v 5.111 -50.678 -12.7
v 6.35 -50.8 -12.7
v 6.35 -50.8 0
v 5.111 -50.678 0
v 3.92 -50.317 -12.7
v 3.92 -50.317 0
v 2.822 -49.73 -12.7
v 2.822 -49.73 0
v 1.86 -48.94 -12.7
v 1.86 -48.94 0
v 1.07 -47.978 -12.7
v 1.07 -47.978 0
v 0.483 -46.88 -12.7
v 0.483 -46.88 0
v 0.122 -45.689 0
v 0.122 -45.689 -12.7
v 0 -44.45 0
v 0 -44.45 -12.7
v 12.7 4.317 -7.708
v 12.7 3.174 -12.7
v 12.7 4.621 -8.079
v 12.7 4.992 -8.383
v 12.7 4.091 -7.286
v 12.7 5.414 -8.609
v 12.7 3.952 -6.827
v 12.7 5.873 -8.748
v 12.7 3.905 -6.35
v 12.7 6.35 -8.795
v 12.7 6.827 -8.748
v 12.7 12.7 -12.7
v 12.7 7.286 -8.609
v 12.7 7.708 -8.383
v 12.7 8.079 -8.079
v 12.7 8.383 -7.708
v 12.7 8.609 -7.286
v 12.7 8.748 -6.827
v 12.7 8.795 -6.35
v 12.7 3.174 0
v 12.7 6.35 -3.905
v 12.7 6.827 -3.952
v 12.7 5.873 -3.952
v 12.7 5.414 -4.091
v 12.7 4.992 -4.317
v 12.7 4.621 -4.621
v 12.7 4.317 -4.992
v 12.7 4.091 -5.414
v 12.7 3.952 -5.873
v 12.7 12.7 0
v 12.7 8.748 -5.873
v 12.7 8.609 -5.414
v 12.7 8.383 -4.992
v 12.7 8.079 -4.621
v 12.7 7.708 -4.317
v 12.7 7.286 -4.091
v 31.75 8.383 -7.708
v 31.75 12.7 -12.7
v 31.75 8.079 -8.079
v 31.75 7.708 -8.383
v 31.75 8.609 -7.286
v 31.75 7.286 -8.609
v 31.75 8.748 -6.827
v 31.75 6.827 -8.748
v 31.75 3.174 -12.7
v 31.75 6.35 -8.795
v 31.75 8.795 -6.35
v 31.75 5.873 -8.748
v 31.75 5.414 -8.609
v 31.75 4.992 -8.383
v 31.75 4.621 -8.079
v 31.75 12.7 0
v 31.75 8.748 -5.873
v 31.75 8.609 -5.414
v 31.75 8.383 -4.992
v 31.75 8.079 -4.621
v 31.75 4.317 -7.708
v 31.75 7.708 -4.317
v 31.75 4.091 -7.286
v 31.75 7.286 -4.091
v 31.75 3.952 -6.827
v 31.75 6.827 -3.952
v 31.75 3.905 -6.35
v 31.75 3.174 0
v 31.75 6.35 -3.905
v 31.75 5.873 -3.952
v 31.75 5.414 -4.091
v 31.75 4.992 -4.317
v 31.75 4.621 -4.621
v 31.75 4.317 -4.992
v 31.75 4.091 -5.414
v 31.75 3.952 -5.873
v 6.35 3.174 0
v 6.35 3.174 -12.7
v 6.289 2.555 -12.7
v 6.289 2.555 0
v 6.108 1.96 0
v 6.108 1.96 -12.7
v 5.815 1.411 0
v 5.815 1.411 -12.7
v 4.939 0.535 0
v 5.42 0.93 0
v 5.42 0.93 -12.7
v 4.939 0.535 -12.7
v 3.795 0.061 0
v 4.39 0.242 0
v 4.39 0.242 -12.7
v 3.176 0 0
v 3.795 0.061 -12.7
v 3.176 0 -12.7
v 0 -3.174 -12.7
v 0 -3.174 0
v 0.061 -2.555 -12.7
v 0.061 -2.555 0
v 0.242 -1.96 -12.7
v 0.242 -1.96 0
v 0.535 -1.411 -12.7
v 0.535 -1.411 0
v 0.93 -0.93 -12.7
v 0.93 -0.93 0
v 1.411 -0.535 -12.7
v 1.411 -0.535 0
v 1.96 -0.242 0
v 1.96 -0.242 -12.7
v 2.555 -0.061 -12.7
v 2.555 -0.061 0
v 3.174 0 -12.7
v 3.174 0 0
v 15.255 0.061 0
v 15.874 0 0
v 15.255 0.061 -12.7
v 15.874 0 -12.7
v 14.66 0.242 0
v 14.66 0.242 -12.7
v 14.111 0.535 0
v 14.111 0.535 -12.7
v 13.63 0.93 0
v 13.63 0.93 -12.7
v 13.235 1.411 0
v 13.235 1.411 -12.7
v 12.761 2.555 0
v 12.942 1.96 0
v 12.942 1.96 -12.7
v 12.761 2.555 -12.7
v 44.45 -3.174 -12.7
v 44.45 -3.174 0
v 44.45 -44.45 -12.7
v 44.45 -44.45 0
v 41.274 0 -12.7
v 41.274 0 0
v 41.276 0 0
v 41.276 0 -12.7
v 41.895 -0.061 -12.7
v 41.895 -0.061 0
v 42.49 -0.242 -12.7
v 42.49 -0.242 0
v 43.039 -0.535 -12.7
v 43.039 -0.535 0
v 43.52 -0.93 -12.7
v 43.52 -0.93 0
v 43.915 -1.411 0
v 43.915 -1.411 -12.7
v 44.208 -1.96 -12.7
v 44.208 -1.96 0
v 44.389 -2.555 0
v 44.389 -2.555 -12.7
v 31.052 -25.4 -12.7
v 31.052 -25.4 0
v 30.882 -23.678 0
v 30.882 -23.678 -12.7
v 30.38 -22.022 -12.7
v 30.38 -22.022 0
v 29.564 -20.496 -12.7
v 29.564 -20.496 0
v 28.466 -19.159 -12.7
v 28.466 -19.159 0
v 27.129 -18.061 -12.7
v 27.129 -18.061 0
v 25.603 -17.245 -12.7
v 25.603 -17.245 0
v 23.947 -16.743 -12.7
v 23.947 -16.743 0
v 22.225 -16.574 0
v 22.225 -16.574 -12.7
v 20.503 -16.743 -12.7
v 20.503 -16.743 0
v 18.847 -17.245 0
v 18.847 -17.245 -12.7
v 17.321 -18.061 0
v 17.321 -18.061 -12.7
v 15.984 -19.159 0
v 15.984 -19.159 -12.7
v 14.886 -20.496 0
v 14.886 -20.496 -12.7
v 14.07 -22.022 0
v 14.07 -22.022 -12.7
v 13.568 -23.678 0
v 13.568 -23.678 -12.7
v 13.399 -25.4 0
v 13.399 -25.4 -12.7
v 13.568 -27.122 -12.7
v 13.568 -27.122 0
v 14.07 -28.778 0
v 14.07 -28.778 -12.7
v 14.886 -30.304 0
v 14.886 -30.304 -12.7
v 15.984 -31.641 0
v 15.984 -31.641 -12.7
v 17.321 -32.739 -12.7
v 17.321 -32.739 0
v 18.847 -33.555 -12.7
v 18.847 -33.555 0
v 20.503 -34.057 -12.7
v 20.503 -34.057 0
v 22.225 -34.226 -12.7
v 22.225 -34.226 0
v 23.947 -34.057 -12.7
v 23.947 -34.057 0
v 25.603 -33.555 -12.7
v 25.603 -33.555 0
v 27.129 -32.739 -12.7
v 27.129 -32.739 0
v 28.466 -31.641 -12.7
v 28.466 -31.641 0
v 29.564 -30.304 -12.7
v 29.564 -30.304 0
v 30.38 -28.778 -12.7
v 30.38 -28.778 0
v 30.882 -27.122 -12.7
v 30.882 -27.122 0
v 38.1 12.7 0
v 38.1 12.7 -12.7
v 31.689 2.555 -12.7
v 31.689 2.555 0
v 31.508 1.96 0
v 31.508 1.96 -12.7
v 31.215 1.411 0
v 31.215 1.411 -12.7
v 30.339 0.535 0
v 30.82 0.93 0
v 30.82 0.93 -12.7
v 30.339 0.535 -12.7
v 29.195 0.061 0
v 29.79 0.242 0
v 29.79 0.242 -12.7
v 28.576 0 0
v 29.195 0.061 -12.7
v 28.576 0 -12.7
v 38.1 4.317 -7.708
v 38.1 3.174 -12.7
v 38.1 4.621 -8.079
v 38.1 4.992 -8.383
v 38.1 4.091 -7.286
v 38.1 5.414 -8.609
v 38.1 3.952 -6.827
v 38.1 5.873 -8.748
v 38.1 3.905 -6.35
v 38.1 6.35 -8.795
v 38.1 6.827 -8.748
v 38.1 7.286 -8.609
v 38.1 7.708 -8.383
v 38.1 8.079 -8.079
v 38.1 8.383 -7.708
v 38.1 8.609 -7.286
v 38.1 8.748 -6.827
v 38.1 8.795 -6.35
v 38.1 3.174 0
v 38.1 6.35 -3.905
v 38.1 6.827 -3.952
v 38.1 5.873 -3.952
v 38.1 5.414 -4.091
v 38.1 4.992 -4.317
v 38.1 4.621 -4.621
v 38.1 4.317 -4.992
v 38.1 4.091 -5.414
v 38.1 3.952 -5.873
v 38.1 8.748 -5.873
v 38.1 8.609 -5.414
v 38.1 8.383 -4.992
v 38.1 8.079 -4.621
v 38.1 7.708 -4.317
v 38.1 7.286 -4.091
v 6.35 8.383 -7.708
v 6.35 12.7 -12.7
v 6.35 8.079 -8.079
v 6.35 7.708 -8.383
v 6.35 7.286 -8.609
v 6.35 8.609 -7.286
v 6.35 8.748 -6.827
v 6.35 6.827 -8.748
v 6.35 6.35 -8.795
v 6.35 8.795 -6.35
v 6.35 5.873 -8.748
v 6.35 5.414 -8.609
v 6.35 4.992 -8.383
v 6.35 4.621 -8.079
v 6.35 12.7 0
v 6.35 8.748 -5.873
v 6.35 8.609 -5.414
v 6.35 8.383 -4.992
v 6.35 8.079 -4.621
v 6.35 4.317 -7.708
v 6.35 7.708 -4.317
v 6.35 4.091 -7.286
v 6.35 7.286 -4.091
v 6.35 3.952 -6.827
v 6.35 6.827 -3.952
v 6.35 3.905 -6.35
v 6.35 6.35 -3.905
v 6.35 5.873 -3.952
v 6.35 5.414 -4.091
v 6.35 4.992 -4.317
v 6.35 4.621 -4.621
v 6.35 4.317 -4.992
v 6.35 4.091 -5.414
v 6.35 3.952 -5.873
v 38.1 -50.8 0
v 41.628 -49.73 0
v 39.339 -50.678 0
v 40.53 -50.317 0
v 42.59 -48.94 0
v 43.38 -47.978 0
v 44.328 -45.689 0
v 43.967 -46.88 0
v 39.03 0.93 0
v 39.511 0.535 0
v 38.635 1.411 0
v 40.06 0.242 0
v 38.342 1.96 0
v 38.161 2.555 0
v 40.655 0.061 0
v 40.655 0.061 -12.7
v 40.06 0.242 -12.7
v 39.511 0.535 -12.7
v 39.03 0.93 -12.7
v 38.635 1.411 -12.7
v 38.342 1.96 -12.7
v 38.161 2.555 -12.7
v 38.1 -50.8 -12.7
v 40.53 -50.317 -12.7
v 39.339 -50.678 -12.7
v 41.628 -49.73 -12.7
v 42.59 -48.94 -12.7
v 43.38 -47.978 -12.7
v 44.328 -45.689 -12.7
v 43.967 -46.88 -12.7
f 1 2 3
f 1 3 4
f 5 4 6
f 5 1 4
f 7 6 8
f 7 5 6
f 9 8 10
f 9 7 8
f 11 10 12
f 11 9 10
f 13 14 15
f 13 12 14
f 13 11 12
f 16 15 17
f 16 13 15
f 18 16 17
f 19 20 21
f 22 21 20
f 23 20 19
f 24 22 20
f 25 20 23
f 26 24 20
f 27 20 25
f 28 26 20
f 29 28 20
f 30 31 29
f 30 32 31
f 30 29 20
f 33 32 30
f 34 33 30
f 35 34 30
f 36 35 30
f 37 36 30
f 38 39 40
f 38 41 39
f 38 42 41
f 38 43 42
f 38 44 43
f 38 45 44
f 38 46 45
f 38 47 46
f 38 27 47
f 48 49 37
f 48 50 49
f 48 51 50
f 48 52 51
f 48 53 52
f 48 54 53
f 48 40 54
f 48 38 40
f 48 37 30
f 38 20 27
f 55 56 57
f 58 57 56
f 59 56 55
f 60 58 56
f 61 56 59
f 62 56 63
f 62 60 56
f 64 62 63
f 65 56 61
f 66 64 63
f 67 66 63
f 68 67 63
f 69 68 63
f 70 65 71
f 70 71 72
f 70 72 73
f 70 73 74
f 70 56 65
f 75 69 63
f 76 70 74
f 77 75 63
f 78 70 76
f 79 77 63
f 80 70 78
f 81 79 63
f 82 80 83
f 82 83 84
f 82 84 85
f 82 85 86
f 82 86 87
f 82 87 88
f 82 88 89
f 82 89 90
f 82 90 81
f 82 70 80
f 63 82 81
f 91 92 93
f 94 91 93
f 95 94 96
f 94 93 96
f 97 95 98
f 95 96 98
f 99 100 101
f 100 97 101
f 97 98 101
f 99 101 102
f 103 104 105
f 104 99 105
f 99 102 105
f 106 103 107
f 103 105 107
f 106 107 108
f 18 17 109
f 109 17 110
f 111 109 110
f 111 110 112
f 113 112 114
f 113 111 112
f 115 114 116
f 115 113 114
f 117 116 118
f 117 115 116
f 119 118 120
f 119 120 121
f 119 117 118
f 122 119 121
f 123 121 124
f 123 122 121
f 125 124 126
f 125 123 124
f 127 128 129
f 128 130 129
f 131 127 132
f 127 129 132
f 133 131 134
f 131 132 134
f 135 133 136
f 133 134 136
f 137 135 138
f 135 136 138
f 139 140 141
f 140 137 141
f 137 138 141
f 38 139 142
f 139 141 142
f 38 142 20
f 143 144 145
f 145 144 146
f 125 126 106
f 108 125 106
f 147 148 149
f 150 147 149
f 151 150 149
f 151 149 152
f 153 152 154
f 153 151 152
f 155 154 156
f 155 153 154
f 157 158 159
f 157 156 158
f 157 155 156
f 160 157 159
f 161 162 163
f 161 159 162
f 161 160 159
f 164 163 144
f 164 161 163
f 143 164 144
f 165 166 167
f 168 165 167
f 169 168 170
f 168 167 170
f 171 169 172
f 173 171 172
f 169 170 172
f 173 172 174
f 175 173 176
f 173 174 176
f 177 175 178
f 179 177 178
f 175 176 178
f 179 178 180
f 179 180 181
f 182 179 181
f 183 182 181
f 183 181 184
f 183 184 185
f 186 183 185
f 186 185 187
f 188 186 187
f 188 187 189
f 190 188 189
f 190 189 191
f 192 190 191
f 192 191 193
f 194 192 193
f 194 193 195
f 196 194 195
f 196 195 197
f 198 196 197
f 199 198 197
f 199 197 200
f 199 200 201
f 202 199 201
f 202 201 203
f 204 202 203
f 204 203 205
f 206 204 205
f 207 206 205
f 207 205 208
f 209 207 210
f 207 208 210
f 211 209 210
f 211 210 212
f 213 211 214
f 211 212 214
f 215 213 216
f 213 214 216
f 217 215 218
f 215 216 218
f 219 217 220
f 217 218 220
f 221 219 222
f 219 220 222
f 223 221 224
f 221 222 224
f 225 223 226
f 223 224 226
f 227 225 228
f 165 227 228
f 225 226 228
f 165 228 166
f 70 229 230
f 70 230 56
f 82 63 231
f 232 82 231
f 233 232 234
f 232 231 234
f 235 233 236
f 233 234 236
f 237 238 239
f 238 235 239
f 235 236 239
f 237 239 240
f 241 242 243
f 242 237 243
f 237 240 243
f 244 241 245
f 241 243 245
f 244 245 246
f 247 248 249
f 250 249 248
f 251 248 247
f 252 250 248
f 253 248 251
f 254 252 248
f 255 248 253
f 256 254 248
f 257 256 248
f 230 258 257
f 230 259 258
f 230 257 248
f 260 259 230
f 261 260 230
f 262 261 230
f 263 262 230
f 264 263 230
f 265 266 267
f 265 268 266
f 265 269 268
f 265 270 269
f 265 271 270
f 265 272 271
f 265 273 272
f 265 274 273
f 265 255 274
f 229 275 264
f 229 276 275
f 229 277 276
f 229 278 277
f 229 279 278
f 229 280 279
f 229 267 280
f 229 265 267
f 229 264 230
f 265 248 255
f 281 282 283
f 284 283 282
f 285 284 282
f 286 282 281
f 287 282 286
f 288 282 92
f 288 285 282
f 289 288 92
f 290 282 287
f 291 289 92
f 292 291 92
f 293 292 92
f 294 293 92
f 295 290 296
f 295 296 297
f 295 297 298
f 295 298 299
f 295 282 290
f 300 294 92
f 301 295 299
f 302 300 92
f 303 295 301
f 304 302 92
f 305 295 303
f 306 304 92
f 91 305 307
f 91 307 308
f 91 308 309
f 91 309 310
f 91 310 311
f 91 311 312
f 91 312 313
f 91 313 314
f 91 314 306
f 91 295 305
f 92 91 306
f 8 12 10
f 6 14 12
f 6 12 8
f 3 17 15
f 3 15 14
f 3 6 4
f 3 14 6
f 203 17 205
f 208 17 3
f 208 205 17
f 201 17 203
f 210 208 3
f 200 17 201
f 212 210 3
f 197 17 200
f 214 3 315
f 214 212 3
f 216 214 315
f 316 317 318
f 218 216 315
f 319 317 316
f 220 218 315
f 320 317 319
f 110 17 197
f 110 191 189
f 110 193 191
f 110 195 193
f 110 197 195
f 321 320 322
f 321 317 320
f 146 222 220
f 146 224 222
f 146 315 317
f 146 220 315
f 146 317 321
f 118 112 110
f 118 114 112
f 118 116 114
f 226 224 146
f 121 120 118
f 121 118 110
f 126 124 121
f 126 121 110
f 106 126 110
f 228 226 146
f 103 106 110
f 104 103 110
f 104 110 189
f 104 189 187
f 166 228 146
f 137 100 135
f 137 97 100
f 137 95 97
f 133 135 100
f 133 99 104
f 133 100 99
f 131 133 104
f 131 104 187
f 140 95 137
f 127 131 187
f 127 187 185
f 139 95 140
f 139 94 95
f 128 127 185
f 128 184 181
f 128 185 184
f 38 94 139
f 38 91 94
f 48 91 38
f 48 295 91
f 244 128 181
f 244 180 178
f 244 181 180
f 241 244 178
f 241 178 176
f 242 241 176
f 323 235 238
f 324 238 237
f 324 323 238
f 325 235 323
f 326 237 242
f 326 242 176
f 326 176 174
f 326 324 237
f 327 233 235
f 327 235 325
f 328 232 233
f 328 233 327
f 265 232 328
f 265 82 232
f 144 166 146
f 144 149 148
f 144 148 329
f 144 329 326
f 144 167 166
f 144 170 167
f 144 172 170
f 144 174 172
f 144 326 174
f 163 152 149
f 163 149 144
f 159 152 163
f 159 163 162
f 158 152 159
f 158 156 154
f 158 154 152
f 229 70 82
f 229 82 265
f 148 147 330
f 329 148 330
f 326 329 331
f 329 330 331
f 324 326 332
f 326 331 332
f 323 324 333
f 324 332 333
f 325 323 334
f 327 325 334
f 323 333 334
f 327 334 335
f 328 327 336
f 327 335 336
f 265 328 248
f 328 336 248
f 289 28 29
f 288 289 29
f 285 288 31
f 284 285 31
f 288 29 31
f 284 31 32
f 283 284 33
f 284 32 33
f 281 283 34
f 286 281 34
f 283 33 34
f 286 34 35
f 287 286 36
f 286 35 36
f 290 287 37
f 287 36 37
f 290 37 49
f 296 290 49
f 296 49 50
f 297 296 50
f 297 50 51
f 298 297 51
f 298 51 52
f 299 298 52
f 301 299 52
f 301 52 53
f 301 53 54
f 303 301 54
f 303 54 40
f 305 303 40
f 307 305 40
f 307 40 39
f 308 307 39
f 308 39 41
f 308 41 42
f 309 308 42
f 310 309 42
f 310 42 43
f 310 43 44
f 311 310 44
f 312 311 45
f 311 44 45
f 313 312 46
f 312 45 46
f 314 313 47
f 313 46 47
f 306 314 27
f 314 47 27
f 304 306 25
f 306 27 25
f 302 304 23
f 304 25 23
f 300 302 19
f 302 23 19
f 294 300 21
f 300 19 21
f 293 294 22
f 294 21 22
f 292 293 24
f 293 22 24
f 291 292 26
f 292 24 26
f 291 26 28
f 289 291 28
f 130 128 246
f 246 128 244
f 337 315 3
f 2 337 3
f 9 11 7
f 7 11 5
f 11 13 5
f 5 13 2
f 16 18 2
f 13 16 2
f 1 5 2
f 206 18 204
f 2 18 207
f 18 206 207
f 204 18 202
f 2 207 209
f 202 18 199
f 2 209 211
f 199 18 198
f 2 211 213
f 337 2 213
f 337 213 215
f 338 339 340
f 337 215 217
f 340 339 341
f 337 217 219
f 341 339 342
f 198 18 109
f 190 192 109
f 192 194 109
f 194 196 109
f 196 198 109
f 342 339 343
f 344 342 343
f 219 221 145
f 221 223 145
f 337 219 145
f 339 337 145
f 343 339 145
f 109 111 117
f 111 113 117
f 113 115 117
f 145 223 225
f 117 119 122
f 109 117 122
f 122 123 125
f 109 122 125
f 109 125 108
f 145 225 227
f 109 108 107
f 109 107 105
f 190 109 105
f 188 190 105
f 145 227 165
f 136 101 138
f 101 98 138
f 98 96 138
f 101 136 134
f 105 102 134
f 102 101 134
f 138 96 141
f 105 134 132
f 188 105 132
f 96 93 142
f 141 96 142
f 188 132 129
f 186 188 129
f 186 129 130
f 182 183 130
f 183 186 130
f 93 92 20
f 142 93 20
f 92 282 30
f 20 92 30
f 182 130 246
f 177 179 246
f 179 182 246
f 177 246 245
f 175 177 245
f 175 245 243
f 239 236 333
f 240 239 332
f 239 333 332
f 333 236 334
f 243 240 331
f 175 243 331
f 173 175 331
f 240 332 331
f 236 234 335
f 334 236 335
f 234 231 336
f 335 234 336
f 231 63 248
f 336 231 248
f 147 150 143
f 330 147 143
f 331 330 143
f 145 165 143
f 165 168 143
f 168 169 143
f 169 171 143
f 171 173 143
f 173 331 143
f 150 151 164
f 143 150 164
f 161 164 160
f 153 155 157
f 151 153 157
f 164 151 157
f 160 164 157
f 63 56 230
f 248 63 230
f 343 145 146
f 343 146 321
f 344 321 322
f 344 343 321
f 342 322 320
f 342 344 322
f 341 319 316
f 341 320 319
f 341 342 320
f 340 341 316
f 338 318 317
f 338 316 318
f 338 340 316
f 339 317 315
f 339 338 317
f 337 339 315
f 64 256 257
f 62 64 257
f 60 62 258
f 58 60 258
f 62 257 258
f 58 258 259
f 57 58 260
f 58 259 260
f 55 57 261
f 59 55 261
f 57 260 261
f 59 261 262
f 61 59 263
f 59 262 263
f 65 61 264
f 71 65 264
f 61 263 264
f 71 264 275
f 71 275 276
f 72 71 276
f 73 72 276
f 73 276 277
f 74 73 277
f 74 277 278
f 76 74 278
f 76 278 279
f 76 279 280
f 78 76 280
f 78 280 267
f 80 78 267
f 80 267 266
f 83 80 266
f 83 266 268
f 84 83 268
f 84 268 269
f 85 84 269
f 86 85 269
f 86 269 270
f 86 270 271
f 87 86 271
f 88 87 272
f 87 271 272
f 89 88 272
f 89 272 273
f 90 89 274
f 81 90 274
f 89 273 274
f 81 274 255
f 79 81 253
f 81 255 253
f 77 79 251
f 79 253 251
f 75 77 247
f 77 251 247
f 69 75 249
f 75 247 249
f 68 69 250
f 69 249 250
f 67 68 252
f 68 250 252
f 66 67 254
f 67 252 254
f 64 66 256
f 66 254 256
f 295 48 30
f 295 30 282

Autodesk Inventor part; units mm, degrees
ref_plane "YZ Plane" through (0, 0, 0) normal (1, 0, 0) x (0, 1, 0)
ref_plane "XZ Plane" through (0, 0, 0) normal (0, 1, 0) x (-1, 0, 0)
ref_plane "XY Plane" through (0, 0, 0) normal (0, 0, 1) x (1, 0, 0)
sketch "Sketch1" plane through (0, 0, 0) normal (0, 0, 1) x (1, 0, 0)
  line L0 (0, 0) -> (44.45, 0)
  line L1 (44.45, 0) -> (44.45, -50.8)
  line L2 (44.45, -50.8) -> (0, -50.8)
  line L3 (0, -50.8) -> (0, 0)
  line L4 (6.35, 0) -> (12.7, 0)
  line L5 (12.7, 0) -> (12.7, 12.7)
  line L6 (12.7, 12.7) -> (6.35, 12.7)
  line L7 (6.35, 12.7) -> (6.35, 0)
  line L8 (31.75, 0) -> (38.1, 0)
  line L9 (38.1, 0) -> (38.1, 12.7)
  line L10 (38.1, 12.7) -> (31.75, 12.7)
  line L11 (31.75, 12.7) -> (31.75, 0)
  circle A0 centre (22.225, -25.4) radius 9.5885
  dimension "d0" = 44.45
  dimension "d1" = 50.8
  dimension "d3" = 6.35
  dimension "d4" = 6.35
  dimension "d5" = 6.35
  dimension "d6" = 19.05
  dimension "d9" = 19.177
  dimension "d20" = 12.7
  dimension "d21" = 22.225
  dimension "d22" = 25.4
  dimension "d25" = 6.35
extrude "Extrusion1" add sketch "Sketch1" against normal blind 12.7 contours L0 L1 L2 L3 | L7 L6 L5 L0 | L11 L10 L9 L0 | A0
sketch "Sketch2" plane through (0, 0, 0) normal (0, 0, 1) x (1, 0, 0)
  circle A0 centre (22.225, -25.4) radius 8.8265
  line L0 (0, -50.8) -> (0, 0) projected
  dimension "d10" = 17.653
  dimension "d23" = 22.225
extrude "Extrusion2" cut sketch "Sketch2" against normal blind 12.7
sketch "Sketch3" plane through (38.1, 0, 0) normal (1, 0, 0) x (0, 0, -1)
  line L0 (12.7, 12.7) -> (12.7, 0) projected
  line L1 (0, 12.7) -> (12.7, 12.7) projected
  circle A0 centre (6.35, 6.35) radius 2.4447
  dimension "d13" = 4.8895
  dimension "d14" = 6.35
  dimension "d15" = 6.35
extrude "Extrusion3" cut sketch "Sketch3" against normal through all
fillet "Fillet2" radius 6.35 2 edges at (44.45, -50.8, -6.35) (0, -50.8, -6.35)
fillet "Fillet3" radius 3.175 6 edges at (38.1, 0, -6.35) (12.7, 0, -6.35) (31.75, 0, -6.35) (6.35, 0, -6.35) (44.45, 0, -6.35) (0, 0, -6.35)
properties part number "Needle Bearing Mount v2"
